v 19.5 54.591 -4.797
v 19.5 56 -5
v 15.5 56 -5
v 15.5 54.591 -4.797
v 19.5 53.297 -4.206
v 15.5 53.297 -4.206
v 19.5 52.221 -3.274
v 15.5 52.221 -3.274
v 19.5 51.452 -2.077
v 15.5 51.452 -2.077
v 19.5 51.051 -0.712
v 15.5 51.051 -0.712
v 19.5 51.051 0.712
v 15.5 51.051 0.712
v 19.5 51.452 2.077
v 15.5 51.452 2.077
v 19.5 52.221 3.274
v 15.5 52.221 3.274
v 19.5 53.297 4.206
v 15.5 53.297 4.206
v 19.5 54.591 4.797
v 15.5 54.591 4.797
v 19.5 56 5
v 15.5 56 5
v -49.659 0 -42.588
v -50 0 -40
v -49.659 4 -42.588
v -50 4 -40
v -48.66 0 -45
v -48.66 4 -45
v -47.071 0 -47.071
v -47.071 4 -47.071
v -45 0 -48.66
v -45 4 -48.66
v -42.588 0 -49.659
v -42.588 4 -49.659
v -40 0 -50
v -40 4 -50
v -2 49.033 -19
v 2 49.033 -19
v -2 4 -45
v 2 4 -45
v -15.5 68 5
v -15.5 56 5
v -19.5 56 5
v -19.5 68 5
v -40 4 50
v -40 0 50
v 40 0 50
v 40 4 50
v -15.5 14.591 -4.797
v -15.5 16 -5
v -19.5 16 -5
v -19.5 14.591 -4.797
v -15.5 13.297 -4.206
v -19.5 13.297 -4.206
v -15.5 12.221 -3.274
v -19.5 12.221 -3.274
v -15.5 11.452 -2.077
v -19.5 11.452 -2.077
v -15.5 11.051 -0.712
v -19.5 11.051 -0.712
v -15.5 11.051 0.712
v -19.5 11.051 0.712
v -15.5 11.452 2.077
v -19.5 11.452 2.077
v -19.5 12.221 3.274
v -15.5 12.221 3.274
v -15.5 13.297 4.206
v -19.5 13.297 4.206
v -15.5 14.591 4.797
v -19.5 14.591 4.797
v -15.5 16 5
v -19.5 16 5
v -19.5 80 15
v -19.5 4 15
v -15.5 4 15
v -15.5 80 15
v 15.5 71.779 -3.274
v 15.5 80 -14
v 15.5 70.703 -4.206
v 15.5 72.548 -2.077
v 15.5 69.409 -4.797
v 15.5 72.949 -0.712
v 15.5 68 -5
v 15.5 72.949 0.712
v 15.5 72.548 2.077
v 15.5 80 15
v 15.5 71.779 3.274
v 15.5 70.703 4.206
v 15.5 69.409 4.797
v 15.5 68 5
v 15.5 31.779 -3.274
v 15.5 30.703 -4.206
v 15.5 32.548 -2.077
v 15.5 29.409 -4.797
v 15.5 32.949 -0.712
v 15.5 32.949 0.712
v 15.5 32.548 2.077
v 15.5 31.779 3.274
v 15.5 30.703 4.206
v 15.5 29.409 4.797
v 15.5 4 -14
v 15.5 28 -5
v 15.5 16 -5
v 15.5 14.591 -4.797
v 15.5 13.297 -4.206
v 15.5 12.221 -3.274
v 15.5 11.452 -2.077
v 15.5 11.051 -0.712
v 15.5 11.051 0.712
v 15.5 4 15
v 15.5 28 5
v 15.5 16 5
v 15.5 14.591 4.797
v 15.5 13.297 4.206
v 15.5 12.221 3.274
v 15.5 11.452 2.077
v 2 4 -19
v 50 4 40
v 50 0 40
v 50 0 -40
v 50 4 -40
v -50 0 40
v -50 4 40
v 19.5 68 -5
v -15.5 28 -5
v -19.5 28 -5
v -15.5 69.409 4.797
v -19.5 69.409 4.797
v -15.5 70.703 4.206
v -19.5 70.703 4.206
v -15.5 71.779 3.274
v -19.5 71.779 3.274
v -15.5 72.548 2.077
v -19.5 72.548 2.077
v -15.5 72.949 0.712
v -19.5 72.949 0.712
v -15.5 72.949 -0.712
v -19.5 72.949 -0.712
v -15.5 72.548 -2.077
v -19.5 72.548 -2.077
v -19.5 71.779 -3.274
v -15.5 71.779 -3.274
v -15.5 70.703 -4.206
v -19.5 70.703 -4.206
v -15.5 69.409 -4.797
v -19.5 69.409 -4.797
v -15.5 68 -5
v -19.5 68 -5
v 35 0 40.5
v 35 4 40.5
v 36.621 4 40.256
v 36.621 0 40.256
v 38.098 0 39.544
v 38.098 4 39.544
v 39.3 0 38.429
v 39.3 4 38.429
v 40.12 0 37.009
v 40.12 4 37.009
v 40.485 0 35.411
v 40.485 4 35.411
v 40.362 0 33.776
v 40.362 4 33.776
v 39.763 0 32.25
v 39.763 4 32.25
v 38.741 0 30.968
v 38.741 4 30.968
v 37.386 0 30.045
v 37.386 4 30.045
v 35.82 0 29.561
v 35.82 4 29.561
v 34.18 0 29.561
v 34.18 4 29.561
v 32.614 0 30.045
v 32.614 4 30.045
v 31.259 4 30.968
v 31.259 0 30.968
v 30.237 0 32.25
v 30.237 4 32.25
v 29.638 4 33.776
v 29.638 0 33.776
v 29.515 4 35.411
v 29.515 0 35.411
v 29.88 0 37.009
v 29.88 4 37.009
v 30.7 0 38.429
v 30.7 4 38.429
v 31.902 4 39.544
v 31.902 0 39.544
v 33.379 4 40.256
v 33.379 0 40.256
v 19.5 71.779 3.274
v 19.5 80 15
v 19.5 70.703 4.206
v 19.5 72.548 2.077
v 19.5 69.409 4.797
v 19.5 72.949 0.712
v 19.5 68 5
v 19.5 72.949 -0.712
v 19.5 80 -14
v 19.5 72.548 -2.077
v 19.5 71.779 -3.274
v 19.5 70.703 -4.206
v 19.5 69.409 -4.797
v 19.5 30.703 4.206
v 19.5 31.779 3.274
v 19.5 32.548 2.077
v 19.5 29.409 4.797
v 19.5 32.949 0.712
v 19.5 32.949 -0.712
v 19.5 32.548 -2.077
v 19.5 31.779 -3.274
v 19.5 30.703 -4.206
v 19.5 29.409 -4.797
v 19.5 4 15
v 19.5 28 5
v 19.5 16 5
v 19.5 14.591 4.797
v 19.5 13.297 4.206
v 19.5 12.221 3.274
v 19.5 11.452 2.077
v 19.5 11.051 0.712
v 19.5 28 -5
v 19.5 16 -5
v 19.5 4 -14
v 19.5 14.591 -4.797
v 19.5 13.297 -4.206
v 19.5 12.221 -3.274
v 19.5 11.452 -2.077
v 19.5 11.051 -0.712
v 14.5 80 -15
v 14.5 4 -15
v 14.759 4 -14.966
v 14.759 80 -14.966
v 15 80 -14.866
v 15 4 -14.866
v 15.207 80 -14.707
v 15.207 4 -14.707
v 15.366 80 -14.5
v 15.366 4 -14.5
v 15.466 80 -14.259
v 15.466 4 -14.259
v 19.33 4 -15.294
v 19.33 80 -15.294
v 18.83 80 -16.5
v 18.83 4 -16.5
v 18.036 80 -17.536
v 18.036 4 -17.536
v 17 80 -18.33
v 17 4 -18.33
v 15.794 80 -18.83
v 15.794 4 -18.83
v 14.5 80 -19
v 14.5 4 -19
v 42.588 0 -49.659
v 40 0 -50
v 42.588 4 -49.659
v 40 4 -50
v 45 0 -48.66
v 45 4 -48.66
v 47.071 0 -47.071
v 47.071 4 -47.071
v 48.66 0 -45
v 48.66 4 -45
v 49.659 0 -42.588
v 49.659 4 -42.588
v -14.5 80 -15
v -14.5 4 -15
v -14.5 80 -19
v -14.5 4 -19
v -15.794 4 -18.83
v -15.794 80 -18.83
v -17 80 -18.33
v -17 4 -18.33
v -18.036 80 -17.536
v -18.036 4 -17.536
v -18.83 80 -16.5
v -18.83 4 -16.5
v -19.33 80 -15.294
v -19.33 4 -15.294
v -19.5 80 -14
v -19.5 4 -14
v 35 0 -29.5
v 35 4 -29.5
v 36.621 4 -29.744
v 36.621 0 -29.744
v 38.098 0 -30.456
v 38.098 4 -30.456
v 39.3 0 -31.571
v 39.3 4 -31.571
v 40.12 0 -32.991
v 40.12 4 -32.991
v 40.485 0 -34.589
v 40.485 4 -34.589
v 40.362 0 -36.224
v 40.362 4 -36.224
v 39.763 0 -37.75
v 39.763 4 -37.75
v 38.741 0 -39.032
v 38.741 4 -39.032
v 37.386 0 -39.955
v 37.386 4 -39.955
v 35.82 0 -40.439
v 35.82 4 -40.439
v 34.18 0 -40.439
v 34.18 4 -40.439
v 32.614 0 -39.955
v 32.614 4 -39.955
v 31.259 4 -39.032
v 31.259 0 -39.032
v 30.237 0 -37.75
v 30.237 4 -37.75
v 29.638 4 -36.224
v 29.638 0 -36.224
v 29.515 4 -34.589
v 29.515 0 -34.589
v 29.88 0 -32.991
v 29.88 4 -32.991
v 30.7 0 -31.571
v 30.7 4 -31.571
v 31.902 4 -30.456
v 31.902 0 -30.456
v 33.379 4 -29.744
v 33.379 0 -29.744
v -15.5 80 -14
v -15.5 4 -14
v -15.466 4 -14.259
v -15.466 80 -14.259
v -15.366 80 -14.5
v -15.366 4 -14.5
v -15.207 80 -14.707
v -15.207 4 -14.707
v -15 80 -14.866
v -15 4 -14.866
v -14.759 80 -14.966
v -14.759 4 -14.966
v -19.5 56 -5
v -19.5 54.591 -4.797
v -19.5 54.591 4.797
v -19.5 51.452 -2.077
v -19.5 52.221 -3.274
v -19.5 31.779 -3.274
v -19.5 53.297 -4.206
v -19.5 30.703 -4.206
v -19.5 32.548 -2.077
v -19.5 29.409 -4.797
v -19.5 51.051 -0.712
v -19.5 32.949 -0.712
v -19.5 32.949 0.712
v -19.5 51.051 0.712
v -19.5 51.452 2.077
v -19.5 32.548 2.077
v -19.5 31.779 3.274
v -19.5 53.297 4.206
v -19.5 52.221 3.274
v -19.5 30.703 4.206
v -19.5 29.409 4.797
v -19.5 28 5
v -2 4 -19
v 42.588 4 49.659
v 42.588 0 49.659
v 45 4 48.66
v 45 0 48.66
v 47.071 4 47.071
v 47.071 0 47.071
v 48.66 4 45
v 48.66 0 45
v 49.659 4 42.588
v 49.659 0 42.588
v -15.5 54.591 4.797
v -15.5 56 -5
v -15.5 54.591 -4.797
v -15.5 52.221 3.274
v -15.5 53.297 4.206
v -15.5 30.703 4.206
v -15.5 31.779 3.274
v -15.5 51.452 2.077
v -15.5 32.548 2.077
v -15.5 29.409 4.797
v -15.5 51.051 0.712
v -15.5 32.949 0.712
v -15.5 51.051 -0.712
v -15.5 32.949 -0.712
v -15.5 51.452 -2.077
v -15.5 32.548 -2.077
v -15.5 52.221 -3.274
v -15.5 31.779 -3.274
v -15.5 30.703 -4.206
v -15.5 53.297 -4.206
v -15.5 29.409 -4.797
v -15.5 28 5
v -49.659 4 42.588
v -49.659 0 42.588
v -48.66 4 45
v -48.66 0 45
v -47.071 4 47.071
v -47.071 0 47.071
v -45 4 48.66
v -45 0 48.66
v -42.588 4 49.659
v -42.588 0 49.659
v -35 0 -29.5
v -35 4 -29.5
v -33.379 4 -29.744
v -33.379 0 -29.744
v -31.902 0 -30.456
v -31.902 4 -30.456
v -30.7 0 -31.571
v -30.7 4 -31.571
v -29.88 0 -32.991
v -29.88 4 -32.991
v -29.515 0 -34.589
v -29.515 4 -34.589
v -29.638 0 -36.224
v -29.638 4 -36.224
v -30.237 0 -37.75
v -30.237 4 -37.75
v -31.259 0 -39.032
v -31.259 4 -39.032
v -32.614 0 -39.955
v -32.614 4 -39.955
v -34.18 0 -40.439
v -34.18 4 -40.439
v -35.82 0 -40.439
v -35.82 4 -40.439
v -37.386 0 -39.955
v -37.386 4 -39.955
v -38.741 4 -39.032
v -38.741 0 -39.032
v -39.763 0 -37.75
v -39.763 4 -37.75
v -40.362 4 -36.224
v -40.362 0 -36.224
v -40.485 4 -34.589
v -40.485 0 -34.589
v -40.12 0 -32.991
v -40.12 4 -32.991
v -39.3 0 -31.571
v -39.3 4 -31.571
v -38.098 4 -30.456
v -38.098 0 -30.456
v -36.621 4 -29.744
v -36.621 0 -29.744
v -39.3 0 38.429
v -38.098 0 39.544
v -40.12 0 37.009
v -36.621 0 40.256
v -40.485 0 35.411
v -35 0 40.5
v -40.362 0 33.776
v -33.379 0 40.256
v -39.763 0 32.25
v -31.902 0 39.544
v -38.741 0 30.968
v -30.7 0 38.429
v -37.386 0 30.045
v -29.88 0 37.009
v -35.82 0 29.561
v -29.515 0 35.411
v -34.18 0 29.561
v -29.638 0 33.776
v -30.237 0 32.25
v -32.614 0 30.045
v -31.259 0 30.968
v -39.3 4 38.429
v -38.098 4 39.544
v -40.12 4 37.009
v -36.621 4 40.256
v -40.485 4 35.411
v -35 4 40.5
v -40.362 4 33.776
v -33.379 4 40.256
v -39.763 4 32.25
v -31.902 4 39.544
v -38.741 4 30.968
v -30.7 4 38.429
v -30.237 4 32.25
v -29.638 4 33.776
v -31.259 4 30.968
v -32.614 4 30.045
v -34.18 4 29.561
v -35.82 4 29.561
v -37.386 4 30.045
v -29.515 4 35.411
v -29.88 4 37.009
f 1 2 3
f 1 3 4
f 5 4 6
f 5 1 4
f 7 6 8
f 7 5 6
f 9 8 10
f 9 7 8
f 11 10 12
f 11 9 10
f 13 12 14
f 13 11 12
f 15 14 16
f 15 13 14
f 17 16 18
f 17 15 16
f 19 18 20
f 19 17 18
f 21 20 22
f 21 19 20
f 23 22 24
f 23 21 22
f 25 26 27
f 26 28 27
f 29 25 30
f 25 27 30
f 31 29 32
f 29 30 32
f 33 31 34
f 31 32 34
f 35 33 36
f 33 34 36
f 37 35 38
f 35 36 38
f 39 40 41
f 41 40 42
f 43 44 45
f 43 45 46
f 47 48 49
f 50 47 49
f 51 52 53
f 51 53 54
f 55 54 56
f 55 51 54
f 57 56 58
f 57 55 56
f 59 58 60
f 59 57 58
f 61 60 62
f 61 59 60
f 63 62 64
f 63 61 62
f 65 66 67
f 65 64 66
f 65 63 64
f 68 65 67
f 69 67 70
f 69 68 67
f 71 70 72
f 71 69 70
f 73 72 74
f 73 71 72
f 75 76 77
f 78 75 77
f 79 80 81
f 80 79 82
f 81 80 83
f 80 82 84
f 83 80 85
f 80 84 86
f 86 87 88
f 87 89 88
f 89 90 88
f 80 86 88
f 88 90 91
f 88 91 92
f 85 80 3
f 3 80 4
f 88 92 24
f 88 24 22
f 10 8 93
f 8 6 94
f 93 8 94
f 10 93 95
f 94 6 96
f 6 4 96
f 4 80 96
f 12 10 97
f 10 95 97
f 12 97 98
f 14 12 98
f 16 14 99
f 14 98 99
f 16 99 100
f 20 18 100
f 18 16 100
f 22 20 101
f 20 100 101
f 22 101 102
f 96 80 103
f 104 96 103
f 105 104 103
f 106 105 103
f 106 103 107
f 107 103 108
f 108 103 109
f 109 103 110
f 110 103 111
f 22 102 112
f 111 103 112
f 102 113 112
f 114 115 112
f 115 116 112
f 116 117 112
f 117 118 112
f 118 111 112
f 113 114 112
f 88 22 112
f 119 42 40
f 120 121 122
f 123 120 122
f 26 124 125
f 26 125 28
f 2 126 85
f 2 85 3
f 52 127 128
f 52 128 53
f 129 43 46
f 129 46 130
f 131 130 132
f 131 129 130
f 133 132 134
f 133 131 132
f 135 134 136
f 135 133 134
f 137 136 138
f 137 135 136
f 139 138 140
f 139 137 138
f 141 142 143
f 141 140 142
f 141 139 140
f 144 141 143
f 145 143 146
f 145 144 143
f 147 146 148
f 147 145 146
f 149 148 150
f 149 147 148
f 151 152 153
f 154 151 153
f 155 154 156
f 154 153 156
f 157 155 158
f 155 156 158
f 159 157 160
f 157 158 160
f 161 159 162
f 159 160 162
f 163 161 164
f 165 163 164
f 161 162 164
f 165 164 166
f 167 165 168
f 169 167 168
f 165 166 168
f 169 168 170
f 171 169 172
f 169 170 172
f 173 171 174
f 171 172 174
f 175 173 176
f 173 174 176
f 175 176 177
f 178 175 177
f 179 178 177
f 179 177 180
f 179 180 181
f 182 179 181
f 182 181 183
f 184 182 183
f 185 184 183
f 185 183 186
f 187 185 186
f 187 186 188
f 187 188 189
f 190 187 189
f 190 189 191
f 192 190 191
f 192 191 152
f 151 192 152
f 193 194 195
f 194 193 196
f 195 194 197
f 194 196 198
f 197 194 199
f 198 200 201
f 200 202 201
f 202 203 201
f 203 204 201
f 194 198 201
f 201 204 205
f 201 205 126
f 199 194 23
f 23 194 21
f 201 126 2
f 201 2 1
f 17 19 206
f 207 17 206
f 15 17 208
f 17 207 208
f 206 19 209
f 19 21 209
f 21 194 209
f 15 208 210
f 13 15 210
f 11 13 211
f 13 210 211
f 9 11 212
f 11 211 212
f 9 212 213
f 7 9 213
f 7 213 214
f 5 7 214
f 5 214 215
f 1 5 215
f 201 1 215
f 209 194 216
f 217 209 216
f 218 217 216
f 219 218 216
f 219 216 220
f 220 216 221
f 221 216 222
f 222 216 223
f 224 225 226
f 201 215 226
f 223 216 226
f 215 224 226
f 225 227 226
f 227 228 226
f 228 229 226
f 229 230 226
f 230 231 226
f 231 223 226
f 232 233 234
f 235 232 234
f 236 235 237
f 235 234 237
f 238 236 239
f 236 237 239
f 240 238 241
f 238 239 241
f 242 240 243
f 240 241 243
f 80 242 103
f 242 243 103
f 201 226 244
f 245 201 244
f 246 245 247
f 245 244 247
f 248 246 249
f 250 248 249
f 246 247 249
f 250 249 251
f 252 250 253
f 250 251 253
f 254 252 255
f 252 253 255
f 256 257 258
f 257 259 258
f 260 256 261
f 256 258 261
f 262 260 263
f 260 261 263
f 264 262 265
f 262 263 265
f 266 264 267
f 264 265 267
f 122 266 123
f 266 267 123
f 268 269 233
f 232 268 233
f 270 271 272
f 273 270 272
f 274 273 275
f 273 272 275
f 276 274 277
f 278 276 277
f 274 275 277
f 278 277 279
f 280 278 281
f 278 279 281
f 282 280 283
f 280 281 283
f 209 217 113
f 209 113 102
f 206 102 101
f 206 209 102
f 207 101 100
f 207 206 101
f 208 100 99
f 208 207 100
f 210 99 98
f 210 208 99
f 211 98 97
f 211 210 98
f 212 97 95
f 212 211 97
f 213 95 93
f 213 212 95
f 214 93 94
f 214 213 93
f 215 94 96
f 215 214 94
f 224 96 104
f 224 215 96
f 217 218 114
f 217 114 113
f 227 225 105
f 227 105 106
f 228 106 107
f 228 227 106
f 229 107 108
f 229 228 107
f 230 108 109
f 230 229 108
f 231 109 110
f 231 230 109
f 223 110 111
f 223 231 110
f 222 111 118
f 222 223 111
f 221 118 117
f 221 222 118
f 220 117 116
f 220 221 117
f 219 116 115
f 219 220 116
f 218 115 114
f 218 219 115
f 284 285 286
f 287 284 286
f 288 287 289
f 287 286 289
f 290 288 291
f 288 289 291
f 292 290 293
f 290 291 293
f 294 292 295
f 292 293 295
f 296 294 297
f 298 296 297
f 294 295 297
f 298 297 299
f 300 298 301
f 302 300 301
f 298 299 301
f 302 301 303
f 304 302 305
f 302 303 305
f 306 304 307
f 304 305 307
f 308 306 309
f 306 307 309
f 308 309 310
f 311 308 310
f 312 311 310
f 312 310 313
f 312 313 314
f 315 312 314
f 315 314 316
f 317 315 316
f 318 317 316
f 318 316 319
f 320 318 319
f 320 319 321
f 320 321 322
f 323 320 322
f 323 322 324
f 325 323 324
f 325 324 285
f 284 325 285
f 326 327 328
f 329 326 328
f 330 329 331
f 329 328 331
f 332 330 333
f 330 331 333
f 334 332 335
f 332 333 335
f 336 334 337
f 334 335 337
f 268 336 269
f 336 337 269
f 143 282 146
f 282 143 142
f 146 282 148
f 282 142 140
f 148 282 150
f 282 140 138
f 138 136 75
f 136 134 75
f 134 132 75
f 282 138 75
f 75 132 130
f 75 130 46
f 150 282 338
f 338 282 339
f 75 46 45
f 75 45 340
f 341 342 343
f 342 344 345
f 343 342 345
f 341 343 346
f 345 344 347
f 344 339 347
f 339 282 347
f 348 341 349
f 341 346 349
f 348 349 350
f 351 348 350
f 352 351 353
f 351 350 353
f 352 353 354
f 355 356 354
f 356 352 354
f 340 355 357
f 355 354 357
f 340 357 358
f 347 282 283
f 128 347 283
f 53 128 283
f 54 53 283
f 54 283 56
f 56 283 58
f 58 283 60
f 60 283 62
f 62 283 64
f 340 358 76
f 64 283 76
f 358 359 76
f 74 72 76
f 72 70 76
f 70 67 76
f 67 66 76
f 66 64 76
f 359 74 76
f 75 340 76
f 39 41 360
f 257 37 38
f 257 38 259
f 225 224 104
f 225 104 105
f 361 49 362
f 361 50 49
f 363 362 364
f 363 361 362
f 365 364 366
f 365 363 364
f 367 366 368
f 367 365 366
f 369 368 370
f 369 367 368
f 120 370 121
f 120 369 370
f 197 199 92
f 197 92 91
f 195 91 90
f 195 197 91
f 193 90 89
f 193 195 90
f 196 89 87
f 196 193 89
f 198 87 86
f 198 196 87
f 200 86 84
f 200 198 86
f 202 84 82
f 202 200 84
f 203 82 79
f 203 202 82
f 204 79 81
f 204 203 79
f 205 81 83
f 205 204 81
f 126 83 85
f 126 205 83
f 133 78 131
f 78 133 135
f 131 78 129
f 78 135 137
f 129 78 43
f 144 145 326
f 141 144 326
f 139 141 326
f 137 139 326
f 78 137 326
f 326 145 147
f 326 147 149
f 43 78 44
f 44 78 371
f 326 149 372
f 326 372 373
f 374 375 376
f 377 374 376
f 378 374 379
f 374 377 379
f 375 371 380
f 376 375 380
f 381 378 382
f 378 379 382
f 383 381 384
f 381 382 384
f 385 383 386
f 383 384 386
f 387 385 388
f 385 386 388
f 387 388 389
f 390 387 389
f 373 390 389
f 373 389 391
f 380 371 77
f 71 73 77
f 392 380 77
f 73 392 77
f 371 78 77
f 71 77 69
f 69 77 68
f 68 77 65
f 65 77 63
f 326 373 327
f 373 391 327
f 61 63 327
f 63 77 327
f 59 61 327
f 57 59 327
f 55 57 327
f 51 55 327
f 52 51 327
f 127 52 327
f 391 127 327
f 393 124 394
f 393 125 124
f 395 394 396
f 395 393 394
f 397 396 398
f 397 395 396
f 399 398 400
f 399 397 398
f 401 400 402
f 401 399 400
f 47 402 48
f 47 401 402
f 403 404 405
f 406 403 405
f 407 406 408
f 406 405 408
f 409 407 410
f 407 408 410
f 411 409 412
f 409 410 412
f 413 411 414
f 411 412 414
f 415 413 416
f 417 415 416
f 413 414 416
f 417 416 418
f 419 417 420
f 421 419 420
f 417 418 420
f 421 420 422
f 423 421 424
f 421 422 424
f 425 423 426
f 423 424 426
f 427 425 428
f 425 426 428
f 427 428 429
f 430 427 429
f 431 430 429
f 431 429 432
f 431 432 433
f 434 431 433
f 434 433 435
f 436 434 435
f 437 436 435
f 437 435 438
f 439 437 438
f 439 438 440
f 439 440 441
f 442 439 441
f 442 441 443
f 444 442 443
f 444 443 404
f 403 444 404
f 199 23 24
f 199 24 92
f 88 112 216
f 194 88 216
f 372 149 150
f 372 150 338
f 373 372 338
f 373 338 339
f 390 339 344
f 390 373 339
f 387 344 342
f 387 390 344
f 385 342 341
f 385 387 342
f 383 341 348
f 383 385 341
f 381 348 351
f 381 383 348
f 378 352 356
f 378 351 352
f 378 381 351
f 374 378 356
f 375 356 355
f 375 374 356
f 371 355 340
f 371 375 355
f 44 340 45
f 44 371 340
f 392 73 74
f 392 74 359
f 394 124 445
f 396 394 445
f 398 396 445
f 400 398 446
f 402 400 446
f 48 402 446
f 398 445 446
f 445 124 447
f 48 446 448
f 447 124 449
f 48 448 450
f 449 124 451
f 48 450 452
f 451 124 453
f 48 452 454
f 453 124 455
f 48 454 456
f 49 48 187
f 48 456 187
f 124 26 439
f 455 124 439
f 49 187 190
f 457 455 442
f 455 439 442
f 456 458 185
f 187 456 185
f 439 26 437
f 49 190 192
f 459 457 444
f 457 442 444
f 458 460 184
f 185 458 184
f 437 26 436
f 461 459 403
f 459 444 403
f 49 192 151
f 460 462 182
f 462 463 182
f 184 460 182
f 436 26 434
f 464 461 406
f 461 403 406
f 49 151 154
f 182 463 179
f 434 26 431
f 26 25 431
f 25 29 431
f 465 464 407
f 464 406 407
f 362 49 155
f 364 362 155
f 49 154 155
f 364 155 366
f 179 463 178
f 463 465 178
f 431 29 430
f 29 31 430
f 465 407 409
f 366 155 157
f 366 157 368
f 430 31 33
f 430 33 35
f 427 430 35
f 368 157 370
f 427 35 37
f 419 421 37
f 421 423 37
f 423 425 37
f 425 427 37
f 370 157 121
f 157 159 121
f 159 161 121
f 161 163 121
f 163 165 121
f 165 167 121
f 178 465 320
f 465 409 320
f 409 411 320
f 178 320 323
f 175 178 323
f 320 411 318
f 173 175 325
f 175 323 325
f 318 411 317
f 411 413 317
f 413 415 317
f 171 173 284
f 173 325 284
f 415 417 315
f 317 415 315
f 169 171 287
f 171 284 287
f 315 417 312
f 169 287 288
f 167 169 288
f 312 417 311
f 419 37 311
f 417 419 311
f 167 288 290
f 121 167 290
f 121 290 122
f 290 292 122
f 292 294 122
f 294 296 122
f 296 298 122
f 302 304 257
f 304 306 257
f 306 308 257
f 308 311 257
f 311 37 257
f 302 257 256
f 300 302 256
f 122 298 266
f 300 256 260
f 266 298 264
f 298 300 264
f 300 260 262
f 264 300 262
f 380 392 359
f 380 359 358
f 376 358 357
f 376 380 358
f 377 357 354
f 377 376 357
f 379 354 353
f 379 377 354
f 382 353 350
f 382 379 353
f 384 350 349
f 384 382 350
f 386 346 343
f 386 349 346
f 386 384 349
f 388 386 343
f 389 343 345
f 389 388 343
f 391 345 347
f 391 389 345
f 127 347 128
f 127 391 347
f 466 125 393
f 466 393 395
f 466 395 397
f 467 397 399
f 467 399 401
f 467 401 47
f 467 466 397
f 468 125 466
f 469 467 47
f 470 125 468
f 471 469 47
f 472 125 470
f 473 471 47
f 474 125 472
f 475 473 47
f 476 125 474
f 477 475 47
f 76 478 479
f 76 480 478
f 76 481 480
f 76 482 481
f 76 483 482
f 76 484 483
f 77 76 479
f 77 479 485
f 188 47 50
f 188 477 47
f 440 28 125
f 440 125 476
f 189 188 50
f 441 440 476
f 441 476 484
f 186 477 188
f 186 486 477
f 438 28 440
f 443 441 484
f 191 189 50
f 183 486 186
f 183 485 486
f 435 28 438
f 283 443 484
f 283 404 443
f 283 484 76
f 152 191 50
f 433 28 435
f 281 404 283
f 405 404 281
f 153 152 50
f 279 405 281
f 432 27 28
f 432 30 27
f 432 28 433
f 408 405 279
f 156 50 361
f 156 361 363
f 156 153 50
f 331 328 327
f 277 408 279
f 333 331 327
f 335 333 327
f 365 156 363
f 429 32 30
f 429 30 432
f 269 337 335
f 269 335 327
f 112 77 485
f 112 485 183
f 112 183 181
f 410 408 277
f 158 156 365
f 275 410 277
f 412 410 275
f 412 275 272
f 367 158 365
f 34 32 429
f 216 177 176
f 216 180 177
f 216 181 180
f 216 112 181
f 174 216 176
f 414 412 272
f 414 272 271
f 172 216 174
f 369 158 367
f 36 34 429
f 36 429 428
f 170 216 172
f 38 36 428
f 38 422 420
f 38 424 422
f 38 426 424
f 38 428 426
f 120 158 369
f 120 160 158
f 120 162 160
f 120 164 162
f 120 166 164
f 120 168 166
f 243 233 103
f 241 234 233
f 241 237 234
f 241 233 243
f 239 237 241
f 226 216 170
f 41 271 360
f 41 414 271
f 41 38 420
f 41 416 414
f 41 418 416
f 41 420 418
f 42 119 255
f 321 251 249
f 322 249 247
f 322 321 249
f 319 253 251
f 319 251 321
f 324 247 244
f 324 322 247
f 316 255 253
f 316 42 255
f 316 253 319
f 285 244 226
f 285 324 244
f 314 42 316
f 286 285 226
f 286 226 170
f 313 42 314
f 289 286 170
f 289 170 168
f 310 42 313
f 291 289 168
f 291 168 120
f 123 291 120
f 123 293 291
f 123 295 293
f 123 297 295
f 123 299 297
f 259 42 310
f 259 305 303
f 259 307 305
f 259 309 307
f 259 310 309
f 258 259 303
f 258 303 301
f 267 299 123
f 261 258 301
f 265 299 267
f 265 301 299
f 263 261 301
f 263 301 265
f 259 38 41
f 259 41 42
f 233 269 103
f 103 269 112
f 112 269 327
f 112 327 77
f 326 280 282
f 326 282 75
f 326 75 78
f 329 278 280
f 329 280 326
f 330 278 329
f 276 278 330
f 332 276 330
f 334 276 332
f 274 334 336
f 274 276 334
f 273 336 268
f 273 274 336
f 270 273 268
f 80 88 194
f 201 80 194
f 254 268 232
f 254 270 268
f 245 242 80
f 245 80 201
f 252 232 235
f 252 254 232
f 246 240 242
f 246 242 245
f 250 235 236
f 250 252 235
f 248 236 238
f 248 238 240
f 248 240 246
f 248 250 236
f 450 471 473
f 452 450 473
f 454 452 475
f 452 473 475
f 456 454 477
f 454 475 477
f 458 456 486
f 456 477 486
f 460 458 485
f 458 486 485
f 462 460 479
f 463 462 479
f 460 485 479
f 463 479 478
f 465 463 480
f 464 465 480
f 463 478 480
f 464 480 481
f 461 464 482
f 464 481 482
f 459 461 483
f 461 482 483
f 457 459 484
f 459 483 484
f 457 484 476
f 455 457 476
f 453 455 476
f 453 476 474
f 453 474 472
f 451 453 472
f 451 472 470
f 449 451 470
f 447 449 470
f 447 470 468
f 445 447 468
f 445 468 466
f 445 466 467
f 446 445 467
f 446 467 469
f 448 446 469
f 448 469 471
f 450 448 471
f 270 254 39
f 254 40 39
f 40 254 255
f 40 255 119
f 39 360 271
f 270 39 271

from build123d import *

# Parameters (mm, degrees)
SKETCH_2_W          = 100
SKETCH_2_H          = 100
EXTRUDE_1_DEPTH     = 4
EXTRUDE_1_2_DEPTH   = 76
EXTRUDE_2_DEPTH     = 2
CUT_EXTRUDE_1_DEPTH = 70.5
SKETCH_6_R          = 5.5
CUT_EXTRUDE_2_DEPTH = 5
FILLET_1_R          = 10


with BuildPart() as part:
    # Эскиз2 → Extrude 1 (new body)
    with BuildSketch(Plane(origin=(0, 0, 0), x_dir=(1, 0, 0), z_dir=(0, 1, 0))):
        Rectangle(SKETCH_2_W, SKETCH_2_H)
    extrude(amount=EXTRUDE_1_DEPTH)

    # Эскиз3 → Extrude 1 2 (add)
    with BuildSketch(Plane(origin=(0, 4, 0), x_dir=(1, 0, 0), z_dir=(0, 1, 0))):
        with BuildLine():
            Line((-15.5, -15), (-15.5, 14))
            ThreePointArc((-15.5, 14), (-15.207106781, 14.707106781), (-14.5, 15))
            Line((-14.5, 15), (14.5, 15))
            ThreePointArc((14.5, 15), (15.207106781, 14.707106781), (15.5, 14))
            Line((15.5, 14), (15.5, -15))
            Line((15.5, -15), (19.5, -15))
            Line((19.5, -15), (19.5, 14))
            ThreePointArc((19.5, 14), (18.035533906, 17.535533906), (14.5, 19))
            Line((14.5, 19), (-14.5, 19))
            ThreePointArc((-14.5, 19), (-18.035533906, 17.535533906), (-19.5, 14))
            Line((-19.5, 14), (-19.5, -15))
            Line((-19.5, -15), (-15.5, -15))
        make_face()
    extrude(amount=EXTRUDE_1_2_DEPTH)

    # Эскиз4 → Бобышка-Вытянуть2 (add, symmetric)
    with BuildSketch(Plane(origin=(0, 0, 0), x_dir=(0, 0, -1), z_dir=(1, 0, 0))):
        Polygon((19, 49.033320997), (45, 4), (19, 4), align=None)
    extrude(amount=EXTRUDE_2_DEPTH, both=True)

    # Эскиз5 → Вырез-Вытянуть1 (cut, through all)
    with BuildSketch(Plane(origin=(19.5, 0, 0), x_dir=(0, 0, -1), z_dir=(1, 0, 0))):
        with BuildLine():
            Line((5, 68), (5, 56))
            ThreePointArc((5, 56), (0, 51), (-5, 56))
            Line((-5, 56), (-5, 68))
            ThreePointArc((-5, 68), (0, 73), (5, 68))
        make_face()
        with BuildLine():
            Line((5, 28), (5, 16))
            ThreePointArc((5, 16), (0, 11), (-5, 16))
            Line((-5, 16), (-5, 28))
            ThreePointArc((-5, 28), (0, 33), (5, 28))
        make_face()
    extrude(amount=-CUT_EXTRUDE_1_DEPTH, mode=Mode.SUBTRACT)

    # Эскиз6 → Вырез-Вытянуть2 (cut, through all)
    with BuildSketch(Plane(origin=(0, 4, 0), x_dir=(1, 0, 0), z_dir=(0, 1, 0))):
        with Locations(Location((-35, 35, 0), (0, 0, 270))):  # turned: the seam where the file's is
            Circle(SKETCH_6_R)
        with Locations(Location((-35, -35, 0), (0, 0, 270))):  # turned: the seam where the file's is
            Circle(SKETCH_6_R)
        with Locations(Location((35, 35, 0), (0, 0, 270))):  # turned: the seam where the file's is
            Circle(SKETCH_6_R)
        with Locations(Location((35, -35, 0), (0, 0, 270))):  # turned: the seam where the file's is
            Circle(SKETCH_6_R)
    extrude(amount=-CUT_EXTRUDE_2_DEPTH, mode=Mode.SUBTRACT)

    # Скругление1
    fillet_1_edges = [part.edges().sort_by_distance(p)[0] for p in [
        (50, 2, 50),
        (-50, 2, 50),
        (-50, 2, -50),
        (50, 2, -50),
    ]]
    fillet(fillet_1_edges, radius=FILLET_1_R)


solid = part.part
